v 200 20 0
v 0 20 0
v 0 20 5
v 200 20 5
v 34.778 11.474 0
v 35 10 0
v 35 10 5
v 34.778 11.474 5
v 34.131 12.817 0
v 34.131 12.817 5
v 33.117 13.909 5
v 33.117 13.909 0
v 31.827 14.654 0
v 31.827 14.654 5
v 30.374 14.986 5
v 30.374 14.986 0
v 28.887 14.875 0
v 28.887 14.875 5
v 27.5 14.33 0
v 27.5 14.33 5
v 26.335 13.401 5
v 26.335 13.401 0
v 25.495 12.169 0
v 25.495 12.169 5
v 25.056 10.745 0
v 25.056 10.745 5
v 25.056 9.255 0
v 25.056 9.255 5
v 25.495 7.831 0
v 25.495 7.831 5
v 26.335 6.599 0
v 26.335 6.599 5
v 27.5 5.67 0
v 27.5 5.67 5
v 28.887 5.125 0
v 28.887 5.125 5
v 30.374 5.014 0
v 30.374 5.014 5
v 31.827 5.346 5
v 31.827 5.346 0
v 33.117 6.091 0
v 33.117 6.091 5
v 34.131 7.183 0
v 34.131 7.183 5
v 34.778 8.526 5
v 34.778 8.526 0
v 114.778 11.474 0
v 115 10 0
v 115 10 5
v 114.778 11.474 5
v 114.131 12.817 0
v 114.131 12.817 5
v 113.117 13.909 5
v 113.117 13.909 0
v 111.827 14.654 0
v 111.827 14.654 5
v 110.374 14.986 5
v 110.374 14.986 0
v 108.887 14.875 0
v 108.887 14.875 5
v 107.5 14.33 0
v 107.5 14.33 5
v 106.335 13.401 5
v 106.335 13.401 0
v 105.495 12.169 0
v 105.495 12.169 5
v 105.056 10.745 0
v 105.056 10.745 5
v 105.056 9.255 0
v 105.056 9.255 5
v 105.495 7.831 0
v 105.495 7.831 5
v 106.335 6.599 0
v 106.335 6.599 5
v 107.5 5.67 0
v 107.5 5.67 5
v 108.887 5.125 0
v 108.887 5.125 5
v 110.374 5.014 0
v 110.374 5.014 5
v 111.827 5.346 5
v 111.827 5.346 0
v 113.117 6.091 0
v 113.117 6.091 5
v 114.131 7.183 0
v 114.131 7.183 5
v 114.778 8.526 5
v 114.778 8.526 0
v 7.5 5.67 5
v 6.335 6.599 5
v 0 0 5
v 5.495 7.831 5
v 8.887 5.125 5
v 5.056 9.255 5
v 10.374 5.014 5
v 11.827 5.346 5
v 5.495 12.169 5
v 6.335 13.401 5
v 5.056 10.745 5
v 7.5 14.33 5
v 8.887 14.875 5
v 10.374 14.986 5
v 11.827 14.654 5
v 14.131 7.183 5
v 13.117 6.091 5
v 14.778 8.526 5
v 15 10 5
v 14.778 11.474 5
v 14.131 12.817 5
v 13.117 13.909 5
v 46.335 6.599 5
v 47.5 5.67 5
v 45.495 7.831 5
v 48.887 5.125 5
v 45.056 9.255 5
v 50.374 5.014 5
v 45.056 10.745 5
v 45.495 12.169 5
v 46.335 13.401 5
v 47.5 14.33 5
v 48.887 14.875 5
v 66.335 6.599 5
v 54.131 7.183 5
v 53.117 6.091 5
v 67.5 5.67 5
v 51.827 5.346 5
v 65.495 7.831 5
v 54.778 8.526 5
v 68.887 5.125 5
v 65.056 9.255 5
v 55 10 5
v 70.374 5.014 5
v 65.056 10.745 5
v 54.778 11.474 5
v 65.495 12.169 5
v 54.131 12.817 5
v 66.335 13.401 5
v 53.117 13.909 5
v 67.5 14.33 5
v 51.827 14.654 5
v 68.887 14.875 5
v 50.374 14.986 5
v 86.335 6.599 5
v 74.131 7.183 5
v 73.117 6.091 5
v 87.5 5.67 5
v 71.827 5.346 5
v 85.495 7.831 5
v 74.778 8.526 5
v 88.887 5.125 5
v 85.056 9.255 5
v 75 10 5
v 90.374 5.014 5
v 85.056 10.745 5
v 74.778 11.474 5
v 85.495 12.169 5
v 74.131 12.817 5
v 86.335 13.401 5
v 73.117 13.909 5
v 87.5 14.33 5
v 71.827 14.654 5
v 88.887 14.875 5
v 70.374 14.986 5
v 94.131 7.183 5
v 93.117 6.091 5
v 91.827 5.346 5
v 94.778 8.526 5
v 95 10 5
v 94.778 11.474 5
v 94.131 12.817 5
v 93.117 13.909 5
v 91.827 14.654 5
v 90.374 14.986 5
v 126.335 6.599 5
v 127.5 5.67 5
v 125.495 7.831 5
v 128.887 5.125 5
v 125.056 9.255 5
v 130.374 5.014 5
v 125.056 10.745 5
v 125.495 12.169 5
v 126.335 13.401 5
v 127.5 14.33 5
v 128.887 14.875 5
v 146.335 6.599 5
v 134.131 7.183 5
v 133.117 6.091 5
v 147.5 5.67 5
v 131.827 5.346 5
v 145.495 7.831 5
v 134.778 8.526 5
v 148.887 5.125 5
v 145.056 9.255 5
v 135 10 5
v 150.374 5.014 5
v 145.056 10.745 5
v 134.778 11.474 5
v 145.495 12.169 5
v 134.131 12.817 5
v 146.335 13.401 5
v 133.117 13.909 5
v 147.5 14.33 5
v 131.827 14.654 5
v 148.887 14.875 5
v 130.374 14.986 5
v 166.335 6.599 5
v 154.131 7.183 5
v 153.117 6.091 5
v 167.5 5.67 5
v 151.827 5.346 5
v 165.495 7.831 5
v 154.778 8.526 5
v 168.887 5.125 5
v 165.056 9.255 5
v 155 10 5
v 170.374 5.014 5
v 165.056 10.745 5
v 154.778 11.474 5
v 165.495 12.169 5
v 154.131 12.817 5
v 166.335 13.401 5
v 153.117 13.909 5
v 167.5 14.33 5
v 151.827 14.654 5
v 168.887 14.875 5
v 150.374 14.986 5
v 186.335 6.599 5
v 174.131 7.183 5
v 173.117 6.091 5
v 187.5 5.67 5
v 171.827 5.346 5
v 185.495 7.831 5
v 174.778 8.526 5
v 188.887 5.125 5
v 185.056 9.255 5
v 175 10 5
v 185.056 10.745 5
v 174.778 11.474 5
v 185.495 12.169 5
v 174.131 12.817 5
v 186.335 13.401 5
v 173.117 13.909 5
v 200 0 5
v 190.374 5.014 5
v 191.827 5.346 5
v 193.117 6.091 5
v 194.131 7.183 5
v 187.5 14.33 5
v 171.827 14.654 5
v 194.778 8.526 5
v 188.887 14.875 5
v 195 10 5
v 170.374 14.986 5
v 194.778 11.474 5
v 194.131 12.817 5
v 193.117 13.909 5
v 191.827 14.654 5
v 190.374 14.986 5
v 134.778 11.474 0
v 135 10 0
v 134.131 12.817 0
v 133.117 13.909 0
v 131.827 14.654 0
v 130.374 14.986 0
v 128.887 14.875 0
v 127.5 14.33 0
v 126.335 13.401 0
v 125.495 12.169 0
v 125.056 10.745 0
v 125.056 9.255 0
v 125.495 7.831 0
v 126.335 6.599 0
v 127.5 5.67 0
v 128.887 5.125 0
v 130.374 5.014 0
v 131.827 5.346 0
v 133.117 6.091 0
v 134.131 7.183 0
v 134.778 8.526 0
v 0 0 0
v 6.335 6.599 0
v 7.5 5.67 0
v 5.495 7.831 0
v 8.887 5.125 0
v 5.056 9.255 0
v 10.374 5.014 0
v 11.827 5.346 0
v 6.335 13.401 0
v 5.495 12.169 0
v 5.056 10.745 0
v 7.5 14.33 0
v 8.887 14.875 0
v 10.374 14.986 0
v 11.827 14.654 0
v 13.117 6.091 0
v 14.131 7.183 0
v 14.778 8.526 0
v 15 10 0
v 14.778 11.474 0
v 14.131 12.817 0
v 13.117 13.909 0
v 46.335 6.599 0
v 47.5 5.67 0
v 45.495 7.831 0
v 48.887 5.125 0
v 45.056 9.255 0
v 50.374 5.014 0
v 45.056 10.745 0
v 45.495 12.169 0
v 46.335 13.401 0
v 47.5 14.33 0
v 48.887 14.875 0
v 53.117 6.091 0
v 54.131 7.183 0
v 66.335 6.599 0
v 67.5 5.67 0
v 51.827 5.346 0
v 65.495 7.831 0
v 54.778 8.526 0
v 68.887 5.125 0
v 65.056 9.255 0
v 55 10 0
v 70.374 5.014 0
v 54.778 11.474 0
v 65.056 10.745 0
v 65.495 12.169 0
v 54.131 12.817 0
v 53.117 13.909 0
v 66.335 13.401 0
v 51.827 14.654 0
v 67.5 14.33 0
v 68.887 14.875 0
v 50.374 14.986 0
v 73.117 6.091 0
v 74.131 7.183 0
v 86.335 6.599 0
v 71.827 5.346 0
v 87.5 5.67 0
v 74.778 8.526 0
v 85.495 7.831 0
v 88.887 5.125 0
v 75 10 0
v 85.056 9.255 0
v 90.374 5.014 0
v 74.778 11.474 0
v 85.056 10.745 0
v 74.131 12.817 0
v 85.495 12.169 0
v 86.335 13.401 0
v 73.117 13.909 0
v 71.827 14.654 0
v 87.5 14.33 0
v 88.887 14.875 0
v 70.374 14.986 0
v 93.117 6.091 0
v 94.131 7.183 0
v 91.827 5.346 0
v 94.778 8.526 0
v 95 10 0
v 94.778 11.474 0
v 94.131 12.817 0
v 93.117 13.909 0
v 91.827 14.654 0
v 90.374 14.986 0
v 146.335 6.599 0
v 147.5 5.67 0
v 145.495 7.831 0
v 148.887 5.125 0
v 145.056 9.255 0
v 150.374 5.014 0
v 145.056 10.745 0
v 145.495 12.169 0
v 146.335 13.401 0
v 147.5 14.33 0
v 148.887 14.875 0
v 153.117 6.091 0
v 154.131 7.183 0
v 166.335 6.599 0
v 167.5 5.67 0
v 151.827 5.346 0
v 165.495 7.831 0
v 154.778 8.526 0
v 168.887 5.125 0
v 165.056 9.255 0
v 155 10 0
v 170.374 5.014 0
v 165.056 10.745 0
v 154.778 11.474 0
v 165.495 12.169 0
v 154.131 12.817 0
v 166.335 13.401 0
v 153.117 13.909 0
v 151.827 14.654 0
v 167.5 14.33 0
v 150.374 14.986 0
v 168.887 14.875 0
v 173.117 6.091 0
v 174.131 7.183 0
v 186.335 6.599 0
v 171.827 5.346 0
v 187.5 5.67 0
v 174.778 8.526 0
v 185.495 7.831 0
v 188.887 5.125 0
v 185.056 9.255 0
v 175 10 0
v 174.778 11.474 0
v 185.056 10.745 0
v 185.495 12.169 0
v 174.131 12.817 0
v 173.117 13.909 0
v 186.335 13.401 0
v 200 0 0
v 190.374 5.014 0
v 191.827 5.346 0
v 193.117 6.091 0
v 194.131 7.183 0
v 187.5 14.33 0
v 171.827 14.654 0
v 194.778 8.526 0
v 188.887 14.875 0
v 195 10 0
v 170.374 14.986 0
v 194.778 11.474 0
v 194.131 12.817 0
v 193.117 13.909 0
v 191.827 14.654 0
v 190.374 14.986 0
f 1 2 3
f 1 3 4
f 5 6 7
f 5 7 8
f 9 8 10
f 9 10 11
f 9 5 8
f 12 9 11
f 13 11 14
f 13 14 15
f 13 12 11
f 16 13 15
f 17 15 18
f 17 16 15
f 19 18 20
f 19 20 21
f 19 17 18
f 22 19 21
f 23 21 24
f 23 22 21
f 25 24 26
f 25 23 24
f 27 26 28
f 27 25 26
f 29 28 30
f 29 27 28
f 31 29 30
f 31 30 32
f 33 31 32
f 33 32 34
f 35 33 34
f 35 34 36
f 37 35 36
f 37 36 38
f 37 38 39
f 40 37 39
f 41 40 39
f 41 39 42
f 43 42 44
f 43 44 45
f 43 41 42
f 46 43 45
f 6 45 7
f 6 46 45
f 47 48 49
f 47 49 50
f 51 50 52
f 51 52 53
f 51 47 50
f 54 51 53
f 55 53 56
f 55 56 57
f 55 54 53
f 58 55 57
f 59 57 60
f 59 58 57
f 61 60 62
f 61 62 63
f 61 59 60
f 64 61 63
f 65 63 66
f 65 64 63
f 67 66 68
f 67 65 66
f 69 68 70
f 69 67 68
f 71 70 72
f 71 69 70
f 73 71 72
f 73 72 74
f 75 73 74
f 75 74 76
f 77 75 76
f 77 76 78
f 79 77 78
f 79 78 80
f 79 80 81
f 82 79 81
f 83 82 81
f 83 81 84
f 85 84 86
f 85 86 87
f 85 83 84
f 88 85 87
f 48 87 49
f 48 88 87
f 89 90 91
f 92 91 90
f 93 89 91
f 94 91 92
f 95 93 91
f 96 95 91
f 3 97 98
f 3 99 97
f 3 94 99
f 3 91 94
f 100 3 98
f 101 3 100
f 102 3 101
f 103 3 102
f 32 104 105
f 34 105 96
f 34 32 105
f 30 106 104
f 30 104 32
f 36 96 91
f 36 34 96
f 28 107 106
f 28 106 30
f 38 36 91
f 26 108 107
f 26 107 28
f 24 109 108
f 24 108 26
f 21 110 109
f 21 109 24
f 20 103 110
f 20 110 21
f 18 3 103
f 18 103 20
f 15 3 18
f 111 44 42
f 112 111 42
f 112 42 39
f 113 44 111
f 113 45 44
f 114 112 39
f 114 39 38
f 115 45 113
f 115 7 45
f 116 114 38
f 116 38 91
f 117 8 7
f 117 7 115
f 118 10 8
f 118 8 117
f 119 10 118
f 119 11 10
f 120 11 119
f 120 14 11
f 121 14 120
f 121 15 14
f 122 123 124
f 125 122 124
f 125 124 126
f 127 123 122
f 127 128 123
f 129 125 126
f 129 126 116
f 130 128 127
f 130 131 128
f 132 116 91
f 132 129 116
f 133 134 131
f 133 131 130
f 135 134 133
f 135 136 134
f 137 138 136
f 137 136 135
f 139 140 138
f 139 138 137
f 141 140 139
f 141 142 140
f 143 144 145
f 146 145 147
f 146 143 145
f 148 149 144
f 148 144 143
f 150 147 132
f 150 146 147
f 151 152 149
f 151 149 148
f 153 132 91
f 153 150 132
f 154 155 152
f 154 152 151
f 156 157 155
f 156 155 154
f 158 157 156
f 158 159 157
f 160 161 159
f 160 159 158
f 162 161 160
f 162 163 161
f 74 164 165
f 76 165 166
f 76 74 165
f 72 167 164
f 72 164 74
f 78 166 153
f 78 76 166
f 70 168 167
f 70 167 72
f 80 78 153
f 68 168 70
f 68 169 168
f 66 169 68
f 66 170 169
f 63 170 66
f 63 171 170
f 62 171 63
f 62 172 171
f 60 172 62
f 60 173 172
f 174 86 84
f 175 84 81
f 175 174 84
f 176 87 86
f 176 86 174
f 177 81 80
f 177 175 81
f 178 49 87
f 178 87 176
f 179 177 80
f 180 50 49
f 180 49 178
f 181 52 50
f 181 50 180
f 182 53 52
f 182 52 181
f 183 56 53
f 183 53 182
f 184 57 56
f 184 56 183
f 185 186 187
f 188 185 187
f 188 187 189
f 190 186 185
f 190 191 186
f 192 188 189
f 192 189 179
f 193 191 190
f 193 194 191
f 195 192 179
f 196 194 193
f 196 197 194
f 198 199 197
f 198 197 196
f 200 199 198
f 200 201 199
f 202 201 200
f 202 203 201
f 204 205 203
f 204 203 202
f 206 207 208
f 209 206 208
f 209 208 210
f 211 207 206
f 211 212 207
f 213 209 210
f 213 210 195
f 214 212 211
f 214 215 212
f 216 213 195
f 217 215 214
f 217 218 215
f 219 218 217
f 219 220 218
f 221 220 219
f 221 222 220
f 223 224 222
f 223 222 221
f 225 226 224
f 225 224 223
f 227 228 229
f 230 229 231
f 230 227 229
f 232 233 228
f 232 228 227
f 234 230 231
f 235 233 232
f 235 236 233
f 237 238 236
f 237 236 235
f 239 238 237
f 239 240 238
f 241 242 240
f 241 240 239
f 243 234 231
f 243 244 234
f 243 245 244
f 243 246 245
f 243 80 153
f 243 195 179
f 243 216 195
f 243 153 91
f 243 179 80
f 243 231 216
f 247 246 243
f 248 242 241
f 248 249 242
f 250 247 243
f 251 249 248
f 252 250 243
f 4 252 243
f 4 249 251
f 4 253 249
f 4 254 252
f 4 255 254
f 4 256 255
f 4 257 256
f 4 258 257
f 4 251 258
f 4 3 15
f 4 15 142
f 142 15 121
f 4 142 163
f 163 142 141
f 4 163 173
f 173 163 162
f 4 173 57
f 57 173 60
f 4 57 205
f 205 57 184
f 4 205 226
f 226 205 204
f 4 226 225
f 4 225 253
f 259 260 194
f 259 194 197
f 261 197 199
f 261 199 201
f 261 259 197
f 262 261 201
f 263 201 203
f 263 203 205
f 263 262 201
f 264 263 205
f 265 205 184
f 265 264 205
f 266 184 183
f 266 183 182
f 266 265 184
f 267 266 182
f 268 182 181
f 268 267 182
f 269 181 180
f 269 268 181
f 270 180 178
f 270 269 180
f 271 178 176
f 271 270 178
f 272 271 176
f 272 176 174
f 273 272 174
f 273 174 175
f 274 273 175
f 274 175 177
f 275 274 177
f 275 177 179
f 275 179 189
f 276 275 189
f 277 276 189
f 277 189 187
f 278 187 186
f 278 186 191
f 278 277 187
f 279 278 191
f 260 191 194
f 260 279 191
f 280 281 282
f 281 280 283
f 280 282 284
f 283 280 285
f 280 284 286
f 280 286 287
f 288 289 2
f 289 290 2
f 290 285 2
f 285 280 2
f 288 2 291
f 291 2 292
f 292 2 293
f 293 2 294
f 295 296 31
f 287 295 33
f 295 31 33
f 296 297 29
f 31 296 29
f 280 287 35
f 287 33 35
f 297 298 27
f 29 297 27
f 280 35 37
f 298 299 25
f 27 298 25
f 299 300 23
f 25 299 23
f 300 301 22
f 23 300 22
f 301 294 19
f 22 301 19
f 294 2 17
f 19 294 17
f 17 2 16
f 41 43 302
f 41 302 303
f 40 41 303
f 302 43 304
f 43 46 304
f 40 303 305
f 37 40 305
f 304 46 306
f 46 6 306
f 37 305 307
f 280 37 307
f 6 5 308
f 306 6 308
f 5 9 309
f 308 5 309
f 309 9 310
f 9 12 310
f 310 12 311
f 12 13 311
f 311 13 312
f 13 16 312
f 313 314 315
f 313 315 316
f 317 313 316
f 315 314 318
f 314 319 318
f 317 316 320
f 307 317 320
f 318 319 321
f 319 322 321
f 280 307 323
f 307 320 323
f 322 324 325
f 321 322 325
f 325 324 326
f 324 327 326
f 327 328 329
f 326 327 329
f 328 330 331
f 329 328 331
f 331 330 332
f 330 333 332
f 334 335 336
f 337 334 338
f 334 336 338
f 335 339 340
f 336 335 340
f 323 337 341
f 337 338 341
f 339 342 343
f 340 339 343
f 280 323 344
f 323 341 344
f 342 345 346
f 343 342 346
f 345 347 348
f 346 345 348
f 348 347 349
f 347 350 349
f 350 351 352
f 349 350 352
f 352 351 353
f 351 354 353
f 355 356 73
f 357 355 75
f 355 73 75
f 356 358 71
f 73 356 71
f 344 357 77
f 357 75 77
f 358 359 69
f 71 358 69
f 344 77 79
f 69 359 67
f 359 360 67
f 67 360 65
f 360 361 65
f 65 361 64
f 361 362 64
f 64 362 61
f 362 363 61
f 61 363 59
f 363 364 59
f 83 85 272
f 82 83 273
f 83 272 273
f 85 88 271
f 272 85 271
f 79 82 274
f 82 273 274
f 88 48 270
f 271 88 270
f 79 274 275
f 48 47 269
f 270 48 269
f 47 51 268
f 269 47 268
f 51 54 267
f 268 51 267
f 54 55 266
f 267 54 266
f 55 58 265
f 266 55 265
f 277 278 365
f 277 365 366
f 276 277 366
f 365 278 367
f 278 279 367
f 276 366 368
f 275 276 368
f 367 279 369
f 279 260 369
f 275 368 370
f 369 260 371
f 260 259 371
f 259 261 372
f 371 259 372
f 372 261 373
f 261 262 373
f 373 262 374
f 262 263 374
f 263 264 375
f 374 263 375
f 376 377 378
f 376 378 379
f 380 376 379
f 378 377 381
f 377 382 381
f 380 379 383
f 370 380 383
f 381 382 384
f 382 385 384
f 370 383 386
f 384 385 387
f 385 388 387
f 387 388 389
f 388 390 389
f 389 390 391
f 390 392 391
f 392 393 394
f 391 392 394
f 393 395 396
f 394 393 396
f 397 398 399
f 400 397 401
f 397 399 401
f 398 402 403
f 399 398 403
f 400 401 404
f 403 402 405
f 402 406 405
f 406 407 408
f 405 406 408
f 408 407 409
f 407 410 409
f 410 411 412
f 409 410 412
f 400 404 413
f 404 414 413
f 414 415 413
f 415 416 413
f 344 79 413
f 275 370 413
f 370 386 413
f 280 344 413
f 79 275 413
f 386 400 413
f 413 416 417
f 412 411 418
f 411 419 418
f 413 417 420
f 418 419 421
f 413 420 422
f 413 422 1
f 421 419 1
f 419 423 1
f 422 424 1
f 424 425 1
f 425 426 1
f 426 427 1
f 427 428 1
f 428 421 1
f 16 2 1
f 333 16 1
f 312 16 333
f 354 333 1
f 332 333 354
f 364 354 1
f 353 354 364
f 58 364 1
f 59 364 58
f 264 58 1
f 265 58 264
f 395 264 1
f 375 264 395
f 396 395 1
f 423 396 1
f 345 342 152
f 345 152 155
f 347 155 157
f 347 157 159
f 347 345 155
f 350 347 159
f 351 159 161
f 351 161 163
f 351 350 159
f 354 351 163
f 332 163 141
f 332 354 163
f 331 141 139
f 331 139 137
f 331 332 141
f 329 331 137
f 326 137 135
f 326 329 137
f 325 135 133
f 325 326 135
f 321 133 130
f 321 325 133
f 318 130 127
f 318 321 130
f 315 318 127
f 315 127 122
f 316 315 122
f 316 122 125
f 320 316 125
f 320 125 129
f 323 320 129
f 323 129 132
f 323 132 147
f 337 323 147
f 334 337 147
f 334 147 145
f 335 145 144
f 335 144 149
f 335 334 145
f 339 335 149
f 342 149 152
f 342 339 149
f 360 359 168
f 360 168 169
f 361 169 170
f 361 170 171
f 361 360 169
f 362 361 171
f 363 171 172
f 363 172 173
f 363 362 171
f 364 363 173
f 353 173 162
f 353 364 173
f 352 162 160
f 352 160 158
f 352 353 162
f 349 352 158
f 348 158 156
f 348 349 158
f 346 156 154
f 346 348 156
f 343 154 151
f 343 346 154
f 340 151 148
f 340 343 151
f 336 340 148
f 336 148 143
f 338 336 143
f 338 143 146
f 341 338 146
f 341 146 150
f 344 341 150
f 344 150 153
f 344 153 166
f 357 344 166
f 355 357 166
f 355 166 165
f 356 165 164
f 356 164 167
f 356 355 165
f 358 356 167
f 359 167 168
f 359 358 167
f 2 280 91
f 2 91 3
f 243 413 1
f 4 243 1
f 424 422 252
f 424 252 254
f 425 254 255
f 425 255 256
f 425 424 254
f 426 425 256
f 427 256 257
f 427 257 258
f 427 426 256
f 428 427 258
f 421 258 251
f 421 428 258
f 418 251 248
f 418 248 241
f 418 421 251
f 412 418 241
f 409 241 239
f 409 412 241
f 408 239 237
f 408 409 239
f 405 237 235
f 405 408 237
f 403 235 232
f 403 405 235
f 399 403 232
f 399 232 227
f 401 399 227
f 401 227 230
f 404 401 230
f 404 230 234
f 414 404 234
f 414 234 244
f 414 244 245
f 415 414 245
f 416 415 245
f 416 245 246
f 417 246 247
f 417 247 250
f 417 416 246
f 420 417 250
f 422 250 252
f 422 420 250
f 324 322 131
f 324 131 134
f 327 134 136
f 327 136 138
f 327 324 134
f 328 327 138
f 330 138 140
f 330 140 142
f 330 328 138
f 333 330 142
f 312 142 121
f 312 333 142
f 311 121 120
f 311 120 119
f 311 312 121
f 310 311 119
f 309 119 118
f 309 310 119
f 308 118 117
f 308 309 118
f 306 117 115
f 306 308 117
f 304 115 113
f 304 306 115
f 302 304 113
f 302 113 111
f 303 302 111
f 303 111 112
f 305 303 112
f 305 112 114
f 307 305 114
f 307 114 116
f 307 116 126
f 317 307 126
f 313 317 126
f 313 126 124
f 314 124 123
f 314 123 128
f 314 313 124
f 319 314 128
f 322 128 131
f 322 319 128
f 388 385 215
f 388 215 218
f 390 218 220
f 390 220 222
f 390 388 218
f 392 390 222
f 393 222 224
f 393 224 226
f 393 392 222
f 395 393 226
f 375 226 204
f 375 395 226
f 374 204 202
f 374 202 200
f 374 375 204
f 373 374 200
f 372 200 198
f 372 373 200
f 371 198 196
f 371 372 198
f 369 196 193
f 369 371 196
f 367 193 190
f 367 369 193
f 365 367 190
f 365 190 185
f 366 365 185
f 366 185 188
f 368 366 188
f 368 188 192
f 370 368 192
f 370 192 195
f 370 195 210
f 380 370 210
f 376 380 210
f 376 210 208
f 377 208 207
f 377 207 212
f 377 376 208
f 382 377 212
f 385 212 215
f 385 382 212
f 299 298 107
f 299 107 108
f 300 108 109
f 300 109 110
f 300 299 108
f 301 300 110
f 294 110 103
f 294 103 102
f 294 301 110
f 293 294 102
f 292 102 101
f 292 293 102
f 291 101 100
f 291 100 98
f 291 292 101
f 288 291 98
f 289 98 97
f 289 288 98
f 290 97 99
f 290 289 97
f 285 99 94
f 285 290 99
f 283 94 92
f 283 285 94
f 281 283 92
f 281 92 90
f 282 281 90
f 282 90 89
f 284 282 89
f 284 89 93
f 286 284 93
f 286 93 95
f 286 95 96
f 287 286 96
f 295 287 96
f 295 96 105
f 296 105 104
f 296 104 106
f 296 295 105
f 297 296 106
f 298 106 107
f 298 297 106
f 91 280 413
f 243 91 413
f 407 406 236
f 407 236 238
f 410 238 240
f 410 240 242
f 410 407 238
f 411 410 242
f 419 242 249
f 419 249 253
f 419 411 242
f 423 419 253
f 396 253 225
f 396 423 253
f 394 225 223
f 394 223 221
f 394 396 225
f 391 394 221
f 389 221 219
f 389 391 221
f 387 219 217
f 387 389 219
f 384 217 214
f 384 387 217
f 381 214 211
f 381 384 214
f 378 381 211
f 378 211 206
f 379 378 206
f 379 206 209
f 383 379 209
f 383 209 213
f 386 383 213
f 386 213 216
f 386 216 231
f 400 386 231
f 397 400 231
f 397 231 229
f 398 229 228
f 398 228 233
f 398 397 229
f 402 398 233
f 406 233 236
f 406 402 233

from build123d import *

# Parameters (mm, degrees)
SZKIC2_W                    = 200
SZKIC2_H                    = 20
SZKIC2_R                    = 5
DODANIE_WYCI_GNI_CIE5_DEPTH = 5
SZYK_LINIOWY1_OUTLINE_R     = 5
SZYK_LINIOWY1_DEPTH         = 5


# Read off the part's stored shape, not the designer's step: Szyk liniowy1
with BuildPart() as part:
    # Szkic2 → Dodanie-wyciągnięcie5 (new body)
    with BuildSketch(Plane.XY):
        with Locations((100, 10)):
            Rectangle(SZKIC2_W, SZKIC2_H)
        with Locations((10, 10)):
            Circle(SZKIC2_R, mode=Mode.SUBTRACT)
    extrude(amount=DODANIE_WYCI_GNI_CIE5_DEPTH)

    # Szyk liniowy1 outline → Szyk liniowy1 (cut)
    with BuildSketch(Plane.XY):
        with Locations((190, 10)):
            Circle(SZYK_LINIOWY1_OUTLINE_R)
        with Locations((170, 10)):
            Circle(SZYK_LINIOWY1_OUTLINE_R)
        with Locations((150, 10)):
            Circle(SZYK_LINIOWY1_OUTLINE_R)
        with Locations((130, 10)):
            Circle(SZYK_LINIOWY1_OUTLINE_R)
        with Locations((110, 10)):
            Circle(SZYK_LINIOWY1_OUTLINE_R)
        with Locations((90, 10)):
            Circle(SZYK_LINIOWY1_OUTLINE_R)
        with Locations((70, 10)):
            Circle(SZYK_LINIOWY1_OUTLINE_R)
        with Locations((50, 10)):
            Circle(SZYK_LINIOWY1_OUTLINE_R)
        with Locations((30, 10)):
            Circle(SZYK_LINIOWY1_OUTLINE_R)
    extrude(amount=SZYK_LINIOWY1_DEPTH, mode=Mode.SUBTRACT)


solid = part.part
